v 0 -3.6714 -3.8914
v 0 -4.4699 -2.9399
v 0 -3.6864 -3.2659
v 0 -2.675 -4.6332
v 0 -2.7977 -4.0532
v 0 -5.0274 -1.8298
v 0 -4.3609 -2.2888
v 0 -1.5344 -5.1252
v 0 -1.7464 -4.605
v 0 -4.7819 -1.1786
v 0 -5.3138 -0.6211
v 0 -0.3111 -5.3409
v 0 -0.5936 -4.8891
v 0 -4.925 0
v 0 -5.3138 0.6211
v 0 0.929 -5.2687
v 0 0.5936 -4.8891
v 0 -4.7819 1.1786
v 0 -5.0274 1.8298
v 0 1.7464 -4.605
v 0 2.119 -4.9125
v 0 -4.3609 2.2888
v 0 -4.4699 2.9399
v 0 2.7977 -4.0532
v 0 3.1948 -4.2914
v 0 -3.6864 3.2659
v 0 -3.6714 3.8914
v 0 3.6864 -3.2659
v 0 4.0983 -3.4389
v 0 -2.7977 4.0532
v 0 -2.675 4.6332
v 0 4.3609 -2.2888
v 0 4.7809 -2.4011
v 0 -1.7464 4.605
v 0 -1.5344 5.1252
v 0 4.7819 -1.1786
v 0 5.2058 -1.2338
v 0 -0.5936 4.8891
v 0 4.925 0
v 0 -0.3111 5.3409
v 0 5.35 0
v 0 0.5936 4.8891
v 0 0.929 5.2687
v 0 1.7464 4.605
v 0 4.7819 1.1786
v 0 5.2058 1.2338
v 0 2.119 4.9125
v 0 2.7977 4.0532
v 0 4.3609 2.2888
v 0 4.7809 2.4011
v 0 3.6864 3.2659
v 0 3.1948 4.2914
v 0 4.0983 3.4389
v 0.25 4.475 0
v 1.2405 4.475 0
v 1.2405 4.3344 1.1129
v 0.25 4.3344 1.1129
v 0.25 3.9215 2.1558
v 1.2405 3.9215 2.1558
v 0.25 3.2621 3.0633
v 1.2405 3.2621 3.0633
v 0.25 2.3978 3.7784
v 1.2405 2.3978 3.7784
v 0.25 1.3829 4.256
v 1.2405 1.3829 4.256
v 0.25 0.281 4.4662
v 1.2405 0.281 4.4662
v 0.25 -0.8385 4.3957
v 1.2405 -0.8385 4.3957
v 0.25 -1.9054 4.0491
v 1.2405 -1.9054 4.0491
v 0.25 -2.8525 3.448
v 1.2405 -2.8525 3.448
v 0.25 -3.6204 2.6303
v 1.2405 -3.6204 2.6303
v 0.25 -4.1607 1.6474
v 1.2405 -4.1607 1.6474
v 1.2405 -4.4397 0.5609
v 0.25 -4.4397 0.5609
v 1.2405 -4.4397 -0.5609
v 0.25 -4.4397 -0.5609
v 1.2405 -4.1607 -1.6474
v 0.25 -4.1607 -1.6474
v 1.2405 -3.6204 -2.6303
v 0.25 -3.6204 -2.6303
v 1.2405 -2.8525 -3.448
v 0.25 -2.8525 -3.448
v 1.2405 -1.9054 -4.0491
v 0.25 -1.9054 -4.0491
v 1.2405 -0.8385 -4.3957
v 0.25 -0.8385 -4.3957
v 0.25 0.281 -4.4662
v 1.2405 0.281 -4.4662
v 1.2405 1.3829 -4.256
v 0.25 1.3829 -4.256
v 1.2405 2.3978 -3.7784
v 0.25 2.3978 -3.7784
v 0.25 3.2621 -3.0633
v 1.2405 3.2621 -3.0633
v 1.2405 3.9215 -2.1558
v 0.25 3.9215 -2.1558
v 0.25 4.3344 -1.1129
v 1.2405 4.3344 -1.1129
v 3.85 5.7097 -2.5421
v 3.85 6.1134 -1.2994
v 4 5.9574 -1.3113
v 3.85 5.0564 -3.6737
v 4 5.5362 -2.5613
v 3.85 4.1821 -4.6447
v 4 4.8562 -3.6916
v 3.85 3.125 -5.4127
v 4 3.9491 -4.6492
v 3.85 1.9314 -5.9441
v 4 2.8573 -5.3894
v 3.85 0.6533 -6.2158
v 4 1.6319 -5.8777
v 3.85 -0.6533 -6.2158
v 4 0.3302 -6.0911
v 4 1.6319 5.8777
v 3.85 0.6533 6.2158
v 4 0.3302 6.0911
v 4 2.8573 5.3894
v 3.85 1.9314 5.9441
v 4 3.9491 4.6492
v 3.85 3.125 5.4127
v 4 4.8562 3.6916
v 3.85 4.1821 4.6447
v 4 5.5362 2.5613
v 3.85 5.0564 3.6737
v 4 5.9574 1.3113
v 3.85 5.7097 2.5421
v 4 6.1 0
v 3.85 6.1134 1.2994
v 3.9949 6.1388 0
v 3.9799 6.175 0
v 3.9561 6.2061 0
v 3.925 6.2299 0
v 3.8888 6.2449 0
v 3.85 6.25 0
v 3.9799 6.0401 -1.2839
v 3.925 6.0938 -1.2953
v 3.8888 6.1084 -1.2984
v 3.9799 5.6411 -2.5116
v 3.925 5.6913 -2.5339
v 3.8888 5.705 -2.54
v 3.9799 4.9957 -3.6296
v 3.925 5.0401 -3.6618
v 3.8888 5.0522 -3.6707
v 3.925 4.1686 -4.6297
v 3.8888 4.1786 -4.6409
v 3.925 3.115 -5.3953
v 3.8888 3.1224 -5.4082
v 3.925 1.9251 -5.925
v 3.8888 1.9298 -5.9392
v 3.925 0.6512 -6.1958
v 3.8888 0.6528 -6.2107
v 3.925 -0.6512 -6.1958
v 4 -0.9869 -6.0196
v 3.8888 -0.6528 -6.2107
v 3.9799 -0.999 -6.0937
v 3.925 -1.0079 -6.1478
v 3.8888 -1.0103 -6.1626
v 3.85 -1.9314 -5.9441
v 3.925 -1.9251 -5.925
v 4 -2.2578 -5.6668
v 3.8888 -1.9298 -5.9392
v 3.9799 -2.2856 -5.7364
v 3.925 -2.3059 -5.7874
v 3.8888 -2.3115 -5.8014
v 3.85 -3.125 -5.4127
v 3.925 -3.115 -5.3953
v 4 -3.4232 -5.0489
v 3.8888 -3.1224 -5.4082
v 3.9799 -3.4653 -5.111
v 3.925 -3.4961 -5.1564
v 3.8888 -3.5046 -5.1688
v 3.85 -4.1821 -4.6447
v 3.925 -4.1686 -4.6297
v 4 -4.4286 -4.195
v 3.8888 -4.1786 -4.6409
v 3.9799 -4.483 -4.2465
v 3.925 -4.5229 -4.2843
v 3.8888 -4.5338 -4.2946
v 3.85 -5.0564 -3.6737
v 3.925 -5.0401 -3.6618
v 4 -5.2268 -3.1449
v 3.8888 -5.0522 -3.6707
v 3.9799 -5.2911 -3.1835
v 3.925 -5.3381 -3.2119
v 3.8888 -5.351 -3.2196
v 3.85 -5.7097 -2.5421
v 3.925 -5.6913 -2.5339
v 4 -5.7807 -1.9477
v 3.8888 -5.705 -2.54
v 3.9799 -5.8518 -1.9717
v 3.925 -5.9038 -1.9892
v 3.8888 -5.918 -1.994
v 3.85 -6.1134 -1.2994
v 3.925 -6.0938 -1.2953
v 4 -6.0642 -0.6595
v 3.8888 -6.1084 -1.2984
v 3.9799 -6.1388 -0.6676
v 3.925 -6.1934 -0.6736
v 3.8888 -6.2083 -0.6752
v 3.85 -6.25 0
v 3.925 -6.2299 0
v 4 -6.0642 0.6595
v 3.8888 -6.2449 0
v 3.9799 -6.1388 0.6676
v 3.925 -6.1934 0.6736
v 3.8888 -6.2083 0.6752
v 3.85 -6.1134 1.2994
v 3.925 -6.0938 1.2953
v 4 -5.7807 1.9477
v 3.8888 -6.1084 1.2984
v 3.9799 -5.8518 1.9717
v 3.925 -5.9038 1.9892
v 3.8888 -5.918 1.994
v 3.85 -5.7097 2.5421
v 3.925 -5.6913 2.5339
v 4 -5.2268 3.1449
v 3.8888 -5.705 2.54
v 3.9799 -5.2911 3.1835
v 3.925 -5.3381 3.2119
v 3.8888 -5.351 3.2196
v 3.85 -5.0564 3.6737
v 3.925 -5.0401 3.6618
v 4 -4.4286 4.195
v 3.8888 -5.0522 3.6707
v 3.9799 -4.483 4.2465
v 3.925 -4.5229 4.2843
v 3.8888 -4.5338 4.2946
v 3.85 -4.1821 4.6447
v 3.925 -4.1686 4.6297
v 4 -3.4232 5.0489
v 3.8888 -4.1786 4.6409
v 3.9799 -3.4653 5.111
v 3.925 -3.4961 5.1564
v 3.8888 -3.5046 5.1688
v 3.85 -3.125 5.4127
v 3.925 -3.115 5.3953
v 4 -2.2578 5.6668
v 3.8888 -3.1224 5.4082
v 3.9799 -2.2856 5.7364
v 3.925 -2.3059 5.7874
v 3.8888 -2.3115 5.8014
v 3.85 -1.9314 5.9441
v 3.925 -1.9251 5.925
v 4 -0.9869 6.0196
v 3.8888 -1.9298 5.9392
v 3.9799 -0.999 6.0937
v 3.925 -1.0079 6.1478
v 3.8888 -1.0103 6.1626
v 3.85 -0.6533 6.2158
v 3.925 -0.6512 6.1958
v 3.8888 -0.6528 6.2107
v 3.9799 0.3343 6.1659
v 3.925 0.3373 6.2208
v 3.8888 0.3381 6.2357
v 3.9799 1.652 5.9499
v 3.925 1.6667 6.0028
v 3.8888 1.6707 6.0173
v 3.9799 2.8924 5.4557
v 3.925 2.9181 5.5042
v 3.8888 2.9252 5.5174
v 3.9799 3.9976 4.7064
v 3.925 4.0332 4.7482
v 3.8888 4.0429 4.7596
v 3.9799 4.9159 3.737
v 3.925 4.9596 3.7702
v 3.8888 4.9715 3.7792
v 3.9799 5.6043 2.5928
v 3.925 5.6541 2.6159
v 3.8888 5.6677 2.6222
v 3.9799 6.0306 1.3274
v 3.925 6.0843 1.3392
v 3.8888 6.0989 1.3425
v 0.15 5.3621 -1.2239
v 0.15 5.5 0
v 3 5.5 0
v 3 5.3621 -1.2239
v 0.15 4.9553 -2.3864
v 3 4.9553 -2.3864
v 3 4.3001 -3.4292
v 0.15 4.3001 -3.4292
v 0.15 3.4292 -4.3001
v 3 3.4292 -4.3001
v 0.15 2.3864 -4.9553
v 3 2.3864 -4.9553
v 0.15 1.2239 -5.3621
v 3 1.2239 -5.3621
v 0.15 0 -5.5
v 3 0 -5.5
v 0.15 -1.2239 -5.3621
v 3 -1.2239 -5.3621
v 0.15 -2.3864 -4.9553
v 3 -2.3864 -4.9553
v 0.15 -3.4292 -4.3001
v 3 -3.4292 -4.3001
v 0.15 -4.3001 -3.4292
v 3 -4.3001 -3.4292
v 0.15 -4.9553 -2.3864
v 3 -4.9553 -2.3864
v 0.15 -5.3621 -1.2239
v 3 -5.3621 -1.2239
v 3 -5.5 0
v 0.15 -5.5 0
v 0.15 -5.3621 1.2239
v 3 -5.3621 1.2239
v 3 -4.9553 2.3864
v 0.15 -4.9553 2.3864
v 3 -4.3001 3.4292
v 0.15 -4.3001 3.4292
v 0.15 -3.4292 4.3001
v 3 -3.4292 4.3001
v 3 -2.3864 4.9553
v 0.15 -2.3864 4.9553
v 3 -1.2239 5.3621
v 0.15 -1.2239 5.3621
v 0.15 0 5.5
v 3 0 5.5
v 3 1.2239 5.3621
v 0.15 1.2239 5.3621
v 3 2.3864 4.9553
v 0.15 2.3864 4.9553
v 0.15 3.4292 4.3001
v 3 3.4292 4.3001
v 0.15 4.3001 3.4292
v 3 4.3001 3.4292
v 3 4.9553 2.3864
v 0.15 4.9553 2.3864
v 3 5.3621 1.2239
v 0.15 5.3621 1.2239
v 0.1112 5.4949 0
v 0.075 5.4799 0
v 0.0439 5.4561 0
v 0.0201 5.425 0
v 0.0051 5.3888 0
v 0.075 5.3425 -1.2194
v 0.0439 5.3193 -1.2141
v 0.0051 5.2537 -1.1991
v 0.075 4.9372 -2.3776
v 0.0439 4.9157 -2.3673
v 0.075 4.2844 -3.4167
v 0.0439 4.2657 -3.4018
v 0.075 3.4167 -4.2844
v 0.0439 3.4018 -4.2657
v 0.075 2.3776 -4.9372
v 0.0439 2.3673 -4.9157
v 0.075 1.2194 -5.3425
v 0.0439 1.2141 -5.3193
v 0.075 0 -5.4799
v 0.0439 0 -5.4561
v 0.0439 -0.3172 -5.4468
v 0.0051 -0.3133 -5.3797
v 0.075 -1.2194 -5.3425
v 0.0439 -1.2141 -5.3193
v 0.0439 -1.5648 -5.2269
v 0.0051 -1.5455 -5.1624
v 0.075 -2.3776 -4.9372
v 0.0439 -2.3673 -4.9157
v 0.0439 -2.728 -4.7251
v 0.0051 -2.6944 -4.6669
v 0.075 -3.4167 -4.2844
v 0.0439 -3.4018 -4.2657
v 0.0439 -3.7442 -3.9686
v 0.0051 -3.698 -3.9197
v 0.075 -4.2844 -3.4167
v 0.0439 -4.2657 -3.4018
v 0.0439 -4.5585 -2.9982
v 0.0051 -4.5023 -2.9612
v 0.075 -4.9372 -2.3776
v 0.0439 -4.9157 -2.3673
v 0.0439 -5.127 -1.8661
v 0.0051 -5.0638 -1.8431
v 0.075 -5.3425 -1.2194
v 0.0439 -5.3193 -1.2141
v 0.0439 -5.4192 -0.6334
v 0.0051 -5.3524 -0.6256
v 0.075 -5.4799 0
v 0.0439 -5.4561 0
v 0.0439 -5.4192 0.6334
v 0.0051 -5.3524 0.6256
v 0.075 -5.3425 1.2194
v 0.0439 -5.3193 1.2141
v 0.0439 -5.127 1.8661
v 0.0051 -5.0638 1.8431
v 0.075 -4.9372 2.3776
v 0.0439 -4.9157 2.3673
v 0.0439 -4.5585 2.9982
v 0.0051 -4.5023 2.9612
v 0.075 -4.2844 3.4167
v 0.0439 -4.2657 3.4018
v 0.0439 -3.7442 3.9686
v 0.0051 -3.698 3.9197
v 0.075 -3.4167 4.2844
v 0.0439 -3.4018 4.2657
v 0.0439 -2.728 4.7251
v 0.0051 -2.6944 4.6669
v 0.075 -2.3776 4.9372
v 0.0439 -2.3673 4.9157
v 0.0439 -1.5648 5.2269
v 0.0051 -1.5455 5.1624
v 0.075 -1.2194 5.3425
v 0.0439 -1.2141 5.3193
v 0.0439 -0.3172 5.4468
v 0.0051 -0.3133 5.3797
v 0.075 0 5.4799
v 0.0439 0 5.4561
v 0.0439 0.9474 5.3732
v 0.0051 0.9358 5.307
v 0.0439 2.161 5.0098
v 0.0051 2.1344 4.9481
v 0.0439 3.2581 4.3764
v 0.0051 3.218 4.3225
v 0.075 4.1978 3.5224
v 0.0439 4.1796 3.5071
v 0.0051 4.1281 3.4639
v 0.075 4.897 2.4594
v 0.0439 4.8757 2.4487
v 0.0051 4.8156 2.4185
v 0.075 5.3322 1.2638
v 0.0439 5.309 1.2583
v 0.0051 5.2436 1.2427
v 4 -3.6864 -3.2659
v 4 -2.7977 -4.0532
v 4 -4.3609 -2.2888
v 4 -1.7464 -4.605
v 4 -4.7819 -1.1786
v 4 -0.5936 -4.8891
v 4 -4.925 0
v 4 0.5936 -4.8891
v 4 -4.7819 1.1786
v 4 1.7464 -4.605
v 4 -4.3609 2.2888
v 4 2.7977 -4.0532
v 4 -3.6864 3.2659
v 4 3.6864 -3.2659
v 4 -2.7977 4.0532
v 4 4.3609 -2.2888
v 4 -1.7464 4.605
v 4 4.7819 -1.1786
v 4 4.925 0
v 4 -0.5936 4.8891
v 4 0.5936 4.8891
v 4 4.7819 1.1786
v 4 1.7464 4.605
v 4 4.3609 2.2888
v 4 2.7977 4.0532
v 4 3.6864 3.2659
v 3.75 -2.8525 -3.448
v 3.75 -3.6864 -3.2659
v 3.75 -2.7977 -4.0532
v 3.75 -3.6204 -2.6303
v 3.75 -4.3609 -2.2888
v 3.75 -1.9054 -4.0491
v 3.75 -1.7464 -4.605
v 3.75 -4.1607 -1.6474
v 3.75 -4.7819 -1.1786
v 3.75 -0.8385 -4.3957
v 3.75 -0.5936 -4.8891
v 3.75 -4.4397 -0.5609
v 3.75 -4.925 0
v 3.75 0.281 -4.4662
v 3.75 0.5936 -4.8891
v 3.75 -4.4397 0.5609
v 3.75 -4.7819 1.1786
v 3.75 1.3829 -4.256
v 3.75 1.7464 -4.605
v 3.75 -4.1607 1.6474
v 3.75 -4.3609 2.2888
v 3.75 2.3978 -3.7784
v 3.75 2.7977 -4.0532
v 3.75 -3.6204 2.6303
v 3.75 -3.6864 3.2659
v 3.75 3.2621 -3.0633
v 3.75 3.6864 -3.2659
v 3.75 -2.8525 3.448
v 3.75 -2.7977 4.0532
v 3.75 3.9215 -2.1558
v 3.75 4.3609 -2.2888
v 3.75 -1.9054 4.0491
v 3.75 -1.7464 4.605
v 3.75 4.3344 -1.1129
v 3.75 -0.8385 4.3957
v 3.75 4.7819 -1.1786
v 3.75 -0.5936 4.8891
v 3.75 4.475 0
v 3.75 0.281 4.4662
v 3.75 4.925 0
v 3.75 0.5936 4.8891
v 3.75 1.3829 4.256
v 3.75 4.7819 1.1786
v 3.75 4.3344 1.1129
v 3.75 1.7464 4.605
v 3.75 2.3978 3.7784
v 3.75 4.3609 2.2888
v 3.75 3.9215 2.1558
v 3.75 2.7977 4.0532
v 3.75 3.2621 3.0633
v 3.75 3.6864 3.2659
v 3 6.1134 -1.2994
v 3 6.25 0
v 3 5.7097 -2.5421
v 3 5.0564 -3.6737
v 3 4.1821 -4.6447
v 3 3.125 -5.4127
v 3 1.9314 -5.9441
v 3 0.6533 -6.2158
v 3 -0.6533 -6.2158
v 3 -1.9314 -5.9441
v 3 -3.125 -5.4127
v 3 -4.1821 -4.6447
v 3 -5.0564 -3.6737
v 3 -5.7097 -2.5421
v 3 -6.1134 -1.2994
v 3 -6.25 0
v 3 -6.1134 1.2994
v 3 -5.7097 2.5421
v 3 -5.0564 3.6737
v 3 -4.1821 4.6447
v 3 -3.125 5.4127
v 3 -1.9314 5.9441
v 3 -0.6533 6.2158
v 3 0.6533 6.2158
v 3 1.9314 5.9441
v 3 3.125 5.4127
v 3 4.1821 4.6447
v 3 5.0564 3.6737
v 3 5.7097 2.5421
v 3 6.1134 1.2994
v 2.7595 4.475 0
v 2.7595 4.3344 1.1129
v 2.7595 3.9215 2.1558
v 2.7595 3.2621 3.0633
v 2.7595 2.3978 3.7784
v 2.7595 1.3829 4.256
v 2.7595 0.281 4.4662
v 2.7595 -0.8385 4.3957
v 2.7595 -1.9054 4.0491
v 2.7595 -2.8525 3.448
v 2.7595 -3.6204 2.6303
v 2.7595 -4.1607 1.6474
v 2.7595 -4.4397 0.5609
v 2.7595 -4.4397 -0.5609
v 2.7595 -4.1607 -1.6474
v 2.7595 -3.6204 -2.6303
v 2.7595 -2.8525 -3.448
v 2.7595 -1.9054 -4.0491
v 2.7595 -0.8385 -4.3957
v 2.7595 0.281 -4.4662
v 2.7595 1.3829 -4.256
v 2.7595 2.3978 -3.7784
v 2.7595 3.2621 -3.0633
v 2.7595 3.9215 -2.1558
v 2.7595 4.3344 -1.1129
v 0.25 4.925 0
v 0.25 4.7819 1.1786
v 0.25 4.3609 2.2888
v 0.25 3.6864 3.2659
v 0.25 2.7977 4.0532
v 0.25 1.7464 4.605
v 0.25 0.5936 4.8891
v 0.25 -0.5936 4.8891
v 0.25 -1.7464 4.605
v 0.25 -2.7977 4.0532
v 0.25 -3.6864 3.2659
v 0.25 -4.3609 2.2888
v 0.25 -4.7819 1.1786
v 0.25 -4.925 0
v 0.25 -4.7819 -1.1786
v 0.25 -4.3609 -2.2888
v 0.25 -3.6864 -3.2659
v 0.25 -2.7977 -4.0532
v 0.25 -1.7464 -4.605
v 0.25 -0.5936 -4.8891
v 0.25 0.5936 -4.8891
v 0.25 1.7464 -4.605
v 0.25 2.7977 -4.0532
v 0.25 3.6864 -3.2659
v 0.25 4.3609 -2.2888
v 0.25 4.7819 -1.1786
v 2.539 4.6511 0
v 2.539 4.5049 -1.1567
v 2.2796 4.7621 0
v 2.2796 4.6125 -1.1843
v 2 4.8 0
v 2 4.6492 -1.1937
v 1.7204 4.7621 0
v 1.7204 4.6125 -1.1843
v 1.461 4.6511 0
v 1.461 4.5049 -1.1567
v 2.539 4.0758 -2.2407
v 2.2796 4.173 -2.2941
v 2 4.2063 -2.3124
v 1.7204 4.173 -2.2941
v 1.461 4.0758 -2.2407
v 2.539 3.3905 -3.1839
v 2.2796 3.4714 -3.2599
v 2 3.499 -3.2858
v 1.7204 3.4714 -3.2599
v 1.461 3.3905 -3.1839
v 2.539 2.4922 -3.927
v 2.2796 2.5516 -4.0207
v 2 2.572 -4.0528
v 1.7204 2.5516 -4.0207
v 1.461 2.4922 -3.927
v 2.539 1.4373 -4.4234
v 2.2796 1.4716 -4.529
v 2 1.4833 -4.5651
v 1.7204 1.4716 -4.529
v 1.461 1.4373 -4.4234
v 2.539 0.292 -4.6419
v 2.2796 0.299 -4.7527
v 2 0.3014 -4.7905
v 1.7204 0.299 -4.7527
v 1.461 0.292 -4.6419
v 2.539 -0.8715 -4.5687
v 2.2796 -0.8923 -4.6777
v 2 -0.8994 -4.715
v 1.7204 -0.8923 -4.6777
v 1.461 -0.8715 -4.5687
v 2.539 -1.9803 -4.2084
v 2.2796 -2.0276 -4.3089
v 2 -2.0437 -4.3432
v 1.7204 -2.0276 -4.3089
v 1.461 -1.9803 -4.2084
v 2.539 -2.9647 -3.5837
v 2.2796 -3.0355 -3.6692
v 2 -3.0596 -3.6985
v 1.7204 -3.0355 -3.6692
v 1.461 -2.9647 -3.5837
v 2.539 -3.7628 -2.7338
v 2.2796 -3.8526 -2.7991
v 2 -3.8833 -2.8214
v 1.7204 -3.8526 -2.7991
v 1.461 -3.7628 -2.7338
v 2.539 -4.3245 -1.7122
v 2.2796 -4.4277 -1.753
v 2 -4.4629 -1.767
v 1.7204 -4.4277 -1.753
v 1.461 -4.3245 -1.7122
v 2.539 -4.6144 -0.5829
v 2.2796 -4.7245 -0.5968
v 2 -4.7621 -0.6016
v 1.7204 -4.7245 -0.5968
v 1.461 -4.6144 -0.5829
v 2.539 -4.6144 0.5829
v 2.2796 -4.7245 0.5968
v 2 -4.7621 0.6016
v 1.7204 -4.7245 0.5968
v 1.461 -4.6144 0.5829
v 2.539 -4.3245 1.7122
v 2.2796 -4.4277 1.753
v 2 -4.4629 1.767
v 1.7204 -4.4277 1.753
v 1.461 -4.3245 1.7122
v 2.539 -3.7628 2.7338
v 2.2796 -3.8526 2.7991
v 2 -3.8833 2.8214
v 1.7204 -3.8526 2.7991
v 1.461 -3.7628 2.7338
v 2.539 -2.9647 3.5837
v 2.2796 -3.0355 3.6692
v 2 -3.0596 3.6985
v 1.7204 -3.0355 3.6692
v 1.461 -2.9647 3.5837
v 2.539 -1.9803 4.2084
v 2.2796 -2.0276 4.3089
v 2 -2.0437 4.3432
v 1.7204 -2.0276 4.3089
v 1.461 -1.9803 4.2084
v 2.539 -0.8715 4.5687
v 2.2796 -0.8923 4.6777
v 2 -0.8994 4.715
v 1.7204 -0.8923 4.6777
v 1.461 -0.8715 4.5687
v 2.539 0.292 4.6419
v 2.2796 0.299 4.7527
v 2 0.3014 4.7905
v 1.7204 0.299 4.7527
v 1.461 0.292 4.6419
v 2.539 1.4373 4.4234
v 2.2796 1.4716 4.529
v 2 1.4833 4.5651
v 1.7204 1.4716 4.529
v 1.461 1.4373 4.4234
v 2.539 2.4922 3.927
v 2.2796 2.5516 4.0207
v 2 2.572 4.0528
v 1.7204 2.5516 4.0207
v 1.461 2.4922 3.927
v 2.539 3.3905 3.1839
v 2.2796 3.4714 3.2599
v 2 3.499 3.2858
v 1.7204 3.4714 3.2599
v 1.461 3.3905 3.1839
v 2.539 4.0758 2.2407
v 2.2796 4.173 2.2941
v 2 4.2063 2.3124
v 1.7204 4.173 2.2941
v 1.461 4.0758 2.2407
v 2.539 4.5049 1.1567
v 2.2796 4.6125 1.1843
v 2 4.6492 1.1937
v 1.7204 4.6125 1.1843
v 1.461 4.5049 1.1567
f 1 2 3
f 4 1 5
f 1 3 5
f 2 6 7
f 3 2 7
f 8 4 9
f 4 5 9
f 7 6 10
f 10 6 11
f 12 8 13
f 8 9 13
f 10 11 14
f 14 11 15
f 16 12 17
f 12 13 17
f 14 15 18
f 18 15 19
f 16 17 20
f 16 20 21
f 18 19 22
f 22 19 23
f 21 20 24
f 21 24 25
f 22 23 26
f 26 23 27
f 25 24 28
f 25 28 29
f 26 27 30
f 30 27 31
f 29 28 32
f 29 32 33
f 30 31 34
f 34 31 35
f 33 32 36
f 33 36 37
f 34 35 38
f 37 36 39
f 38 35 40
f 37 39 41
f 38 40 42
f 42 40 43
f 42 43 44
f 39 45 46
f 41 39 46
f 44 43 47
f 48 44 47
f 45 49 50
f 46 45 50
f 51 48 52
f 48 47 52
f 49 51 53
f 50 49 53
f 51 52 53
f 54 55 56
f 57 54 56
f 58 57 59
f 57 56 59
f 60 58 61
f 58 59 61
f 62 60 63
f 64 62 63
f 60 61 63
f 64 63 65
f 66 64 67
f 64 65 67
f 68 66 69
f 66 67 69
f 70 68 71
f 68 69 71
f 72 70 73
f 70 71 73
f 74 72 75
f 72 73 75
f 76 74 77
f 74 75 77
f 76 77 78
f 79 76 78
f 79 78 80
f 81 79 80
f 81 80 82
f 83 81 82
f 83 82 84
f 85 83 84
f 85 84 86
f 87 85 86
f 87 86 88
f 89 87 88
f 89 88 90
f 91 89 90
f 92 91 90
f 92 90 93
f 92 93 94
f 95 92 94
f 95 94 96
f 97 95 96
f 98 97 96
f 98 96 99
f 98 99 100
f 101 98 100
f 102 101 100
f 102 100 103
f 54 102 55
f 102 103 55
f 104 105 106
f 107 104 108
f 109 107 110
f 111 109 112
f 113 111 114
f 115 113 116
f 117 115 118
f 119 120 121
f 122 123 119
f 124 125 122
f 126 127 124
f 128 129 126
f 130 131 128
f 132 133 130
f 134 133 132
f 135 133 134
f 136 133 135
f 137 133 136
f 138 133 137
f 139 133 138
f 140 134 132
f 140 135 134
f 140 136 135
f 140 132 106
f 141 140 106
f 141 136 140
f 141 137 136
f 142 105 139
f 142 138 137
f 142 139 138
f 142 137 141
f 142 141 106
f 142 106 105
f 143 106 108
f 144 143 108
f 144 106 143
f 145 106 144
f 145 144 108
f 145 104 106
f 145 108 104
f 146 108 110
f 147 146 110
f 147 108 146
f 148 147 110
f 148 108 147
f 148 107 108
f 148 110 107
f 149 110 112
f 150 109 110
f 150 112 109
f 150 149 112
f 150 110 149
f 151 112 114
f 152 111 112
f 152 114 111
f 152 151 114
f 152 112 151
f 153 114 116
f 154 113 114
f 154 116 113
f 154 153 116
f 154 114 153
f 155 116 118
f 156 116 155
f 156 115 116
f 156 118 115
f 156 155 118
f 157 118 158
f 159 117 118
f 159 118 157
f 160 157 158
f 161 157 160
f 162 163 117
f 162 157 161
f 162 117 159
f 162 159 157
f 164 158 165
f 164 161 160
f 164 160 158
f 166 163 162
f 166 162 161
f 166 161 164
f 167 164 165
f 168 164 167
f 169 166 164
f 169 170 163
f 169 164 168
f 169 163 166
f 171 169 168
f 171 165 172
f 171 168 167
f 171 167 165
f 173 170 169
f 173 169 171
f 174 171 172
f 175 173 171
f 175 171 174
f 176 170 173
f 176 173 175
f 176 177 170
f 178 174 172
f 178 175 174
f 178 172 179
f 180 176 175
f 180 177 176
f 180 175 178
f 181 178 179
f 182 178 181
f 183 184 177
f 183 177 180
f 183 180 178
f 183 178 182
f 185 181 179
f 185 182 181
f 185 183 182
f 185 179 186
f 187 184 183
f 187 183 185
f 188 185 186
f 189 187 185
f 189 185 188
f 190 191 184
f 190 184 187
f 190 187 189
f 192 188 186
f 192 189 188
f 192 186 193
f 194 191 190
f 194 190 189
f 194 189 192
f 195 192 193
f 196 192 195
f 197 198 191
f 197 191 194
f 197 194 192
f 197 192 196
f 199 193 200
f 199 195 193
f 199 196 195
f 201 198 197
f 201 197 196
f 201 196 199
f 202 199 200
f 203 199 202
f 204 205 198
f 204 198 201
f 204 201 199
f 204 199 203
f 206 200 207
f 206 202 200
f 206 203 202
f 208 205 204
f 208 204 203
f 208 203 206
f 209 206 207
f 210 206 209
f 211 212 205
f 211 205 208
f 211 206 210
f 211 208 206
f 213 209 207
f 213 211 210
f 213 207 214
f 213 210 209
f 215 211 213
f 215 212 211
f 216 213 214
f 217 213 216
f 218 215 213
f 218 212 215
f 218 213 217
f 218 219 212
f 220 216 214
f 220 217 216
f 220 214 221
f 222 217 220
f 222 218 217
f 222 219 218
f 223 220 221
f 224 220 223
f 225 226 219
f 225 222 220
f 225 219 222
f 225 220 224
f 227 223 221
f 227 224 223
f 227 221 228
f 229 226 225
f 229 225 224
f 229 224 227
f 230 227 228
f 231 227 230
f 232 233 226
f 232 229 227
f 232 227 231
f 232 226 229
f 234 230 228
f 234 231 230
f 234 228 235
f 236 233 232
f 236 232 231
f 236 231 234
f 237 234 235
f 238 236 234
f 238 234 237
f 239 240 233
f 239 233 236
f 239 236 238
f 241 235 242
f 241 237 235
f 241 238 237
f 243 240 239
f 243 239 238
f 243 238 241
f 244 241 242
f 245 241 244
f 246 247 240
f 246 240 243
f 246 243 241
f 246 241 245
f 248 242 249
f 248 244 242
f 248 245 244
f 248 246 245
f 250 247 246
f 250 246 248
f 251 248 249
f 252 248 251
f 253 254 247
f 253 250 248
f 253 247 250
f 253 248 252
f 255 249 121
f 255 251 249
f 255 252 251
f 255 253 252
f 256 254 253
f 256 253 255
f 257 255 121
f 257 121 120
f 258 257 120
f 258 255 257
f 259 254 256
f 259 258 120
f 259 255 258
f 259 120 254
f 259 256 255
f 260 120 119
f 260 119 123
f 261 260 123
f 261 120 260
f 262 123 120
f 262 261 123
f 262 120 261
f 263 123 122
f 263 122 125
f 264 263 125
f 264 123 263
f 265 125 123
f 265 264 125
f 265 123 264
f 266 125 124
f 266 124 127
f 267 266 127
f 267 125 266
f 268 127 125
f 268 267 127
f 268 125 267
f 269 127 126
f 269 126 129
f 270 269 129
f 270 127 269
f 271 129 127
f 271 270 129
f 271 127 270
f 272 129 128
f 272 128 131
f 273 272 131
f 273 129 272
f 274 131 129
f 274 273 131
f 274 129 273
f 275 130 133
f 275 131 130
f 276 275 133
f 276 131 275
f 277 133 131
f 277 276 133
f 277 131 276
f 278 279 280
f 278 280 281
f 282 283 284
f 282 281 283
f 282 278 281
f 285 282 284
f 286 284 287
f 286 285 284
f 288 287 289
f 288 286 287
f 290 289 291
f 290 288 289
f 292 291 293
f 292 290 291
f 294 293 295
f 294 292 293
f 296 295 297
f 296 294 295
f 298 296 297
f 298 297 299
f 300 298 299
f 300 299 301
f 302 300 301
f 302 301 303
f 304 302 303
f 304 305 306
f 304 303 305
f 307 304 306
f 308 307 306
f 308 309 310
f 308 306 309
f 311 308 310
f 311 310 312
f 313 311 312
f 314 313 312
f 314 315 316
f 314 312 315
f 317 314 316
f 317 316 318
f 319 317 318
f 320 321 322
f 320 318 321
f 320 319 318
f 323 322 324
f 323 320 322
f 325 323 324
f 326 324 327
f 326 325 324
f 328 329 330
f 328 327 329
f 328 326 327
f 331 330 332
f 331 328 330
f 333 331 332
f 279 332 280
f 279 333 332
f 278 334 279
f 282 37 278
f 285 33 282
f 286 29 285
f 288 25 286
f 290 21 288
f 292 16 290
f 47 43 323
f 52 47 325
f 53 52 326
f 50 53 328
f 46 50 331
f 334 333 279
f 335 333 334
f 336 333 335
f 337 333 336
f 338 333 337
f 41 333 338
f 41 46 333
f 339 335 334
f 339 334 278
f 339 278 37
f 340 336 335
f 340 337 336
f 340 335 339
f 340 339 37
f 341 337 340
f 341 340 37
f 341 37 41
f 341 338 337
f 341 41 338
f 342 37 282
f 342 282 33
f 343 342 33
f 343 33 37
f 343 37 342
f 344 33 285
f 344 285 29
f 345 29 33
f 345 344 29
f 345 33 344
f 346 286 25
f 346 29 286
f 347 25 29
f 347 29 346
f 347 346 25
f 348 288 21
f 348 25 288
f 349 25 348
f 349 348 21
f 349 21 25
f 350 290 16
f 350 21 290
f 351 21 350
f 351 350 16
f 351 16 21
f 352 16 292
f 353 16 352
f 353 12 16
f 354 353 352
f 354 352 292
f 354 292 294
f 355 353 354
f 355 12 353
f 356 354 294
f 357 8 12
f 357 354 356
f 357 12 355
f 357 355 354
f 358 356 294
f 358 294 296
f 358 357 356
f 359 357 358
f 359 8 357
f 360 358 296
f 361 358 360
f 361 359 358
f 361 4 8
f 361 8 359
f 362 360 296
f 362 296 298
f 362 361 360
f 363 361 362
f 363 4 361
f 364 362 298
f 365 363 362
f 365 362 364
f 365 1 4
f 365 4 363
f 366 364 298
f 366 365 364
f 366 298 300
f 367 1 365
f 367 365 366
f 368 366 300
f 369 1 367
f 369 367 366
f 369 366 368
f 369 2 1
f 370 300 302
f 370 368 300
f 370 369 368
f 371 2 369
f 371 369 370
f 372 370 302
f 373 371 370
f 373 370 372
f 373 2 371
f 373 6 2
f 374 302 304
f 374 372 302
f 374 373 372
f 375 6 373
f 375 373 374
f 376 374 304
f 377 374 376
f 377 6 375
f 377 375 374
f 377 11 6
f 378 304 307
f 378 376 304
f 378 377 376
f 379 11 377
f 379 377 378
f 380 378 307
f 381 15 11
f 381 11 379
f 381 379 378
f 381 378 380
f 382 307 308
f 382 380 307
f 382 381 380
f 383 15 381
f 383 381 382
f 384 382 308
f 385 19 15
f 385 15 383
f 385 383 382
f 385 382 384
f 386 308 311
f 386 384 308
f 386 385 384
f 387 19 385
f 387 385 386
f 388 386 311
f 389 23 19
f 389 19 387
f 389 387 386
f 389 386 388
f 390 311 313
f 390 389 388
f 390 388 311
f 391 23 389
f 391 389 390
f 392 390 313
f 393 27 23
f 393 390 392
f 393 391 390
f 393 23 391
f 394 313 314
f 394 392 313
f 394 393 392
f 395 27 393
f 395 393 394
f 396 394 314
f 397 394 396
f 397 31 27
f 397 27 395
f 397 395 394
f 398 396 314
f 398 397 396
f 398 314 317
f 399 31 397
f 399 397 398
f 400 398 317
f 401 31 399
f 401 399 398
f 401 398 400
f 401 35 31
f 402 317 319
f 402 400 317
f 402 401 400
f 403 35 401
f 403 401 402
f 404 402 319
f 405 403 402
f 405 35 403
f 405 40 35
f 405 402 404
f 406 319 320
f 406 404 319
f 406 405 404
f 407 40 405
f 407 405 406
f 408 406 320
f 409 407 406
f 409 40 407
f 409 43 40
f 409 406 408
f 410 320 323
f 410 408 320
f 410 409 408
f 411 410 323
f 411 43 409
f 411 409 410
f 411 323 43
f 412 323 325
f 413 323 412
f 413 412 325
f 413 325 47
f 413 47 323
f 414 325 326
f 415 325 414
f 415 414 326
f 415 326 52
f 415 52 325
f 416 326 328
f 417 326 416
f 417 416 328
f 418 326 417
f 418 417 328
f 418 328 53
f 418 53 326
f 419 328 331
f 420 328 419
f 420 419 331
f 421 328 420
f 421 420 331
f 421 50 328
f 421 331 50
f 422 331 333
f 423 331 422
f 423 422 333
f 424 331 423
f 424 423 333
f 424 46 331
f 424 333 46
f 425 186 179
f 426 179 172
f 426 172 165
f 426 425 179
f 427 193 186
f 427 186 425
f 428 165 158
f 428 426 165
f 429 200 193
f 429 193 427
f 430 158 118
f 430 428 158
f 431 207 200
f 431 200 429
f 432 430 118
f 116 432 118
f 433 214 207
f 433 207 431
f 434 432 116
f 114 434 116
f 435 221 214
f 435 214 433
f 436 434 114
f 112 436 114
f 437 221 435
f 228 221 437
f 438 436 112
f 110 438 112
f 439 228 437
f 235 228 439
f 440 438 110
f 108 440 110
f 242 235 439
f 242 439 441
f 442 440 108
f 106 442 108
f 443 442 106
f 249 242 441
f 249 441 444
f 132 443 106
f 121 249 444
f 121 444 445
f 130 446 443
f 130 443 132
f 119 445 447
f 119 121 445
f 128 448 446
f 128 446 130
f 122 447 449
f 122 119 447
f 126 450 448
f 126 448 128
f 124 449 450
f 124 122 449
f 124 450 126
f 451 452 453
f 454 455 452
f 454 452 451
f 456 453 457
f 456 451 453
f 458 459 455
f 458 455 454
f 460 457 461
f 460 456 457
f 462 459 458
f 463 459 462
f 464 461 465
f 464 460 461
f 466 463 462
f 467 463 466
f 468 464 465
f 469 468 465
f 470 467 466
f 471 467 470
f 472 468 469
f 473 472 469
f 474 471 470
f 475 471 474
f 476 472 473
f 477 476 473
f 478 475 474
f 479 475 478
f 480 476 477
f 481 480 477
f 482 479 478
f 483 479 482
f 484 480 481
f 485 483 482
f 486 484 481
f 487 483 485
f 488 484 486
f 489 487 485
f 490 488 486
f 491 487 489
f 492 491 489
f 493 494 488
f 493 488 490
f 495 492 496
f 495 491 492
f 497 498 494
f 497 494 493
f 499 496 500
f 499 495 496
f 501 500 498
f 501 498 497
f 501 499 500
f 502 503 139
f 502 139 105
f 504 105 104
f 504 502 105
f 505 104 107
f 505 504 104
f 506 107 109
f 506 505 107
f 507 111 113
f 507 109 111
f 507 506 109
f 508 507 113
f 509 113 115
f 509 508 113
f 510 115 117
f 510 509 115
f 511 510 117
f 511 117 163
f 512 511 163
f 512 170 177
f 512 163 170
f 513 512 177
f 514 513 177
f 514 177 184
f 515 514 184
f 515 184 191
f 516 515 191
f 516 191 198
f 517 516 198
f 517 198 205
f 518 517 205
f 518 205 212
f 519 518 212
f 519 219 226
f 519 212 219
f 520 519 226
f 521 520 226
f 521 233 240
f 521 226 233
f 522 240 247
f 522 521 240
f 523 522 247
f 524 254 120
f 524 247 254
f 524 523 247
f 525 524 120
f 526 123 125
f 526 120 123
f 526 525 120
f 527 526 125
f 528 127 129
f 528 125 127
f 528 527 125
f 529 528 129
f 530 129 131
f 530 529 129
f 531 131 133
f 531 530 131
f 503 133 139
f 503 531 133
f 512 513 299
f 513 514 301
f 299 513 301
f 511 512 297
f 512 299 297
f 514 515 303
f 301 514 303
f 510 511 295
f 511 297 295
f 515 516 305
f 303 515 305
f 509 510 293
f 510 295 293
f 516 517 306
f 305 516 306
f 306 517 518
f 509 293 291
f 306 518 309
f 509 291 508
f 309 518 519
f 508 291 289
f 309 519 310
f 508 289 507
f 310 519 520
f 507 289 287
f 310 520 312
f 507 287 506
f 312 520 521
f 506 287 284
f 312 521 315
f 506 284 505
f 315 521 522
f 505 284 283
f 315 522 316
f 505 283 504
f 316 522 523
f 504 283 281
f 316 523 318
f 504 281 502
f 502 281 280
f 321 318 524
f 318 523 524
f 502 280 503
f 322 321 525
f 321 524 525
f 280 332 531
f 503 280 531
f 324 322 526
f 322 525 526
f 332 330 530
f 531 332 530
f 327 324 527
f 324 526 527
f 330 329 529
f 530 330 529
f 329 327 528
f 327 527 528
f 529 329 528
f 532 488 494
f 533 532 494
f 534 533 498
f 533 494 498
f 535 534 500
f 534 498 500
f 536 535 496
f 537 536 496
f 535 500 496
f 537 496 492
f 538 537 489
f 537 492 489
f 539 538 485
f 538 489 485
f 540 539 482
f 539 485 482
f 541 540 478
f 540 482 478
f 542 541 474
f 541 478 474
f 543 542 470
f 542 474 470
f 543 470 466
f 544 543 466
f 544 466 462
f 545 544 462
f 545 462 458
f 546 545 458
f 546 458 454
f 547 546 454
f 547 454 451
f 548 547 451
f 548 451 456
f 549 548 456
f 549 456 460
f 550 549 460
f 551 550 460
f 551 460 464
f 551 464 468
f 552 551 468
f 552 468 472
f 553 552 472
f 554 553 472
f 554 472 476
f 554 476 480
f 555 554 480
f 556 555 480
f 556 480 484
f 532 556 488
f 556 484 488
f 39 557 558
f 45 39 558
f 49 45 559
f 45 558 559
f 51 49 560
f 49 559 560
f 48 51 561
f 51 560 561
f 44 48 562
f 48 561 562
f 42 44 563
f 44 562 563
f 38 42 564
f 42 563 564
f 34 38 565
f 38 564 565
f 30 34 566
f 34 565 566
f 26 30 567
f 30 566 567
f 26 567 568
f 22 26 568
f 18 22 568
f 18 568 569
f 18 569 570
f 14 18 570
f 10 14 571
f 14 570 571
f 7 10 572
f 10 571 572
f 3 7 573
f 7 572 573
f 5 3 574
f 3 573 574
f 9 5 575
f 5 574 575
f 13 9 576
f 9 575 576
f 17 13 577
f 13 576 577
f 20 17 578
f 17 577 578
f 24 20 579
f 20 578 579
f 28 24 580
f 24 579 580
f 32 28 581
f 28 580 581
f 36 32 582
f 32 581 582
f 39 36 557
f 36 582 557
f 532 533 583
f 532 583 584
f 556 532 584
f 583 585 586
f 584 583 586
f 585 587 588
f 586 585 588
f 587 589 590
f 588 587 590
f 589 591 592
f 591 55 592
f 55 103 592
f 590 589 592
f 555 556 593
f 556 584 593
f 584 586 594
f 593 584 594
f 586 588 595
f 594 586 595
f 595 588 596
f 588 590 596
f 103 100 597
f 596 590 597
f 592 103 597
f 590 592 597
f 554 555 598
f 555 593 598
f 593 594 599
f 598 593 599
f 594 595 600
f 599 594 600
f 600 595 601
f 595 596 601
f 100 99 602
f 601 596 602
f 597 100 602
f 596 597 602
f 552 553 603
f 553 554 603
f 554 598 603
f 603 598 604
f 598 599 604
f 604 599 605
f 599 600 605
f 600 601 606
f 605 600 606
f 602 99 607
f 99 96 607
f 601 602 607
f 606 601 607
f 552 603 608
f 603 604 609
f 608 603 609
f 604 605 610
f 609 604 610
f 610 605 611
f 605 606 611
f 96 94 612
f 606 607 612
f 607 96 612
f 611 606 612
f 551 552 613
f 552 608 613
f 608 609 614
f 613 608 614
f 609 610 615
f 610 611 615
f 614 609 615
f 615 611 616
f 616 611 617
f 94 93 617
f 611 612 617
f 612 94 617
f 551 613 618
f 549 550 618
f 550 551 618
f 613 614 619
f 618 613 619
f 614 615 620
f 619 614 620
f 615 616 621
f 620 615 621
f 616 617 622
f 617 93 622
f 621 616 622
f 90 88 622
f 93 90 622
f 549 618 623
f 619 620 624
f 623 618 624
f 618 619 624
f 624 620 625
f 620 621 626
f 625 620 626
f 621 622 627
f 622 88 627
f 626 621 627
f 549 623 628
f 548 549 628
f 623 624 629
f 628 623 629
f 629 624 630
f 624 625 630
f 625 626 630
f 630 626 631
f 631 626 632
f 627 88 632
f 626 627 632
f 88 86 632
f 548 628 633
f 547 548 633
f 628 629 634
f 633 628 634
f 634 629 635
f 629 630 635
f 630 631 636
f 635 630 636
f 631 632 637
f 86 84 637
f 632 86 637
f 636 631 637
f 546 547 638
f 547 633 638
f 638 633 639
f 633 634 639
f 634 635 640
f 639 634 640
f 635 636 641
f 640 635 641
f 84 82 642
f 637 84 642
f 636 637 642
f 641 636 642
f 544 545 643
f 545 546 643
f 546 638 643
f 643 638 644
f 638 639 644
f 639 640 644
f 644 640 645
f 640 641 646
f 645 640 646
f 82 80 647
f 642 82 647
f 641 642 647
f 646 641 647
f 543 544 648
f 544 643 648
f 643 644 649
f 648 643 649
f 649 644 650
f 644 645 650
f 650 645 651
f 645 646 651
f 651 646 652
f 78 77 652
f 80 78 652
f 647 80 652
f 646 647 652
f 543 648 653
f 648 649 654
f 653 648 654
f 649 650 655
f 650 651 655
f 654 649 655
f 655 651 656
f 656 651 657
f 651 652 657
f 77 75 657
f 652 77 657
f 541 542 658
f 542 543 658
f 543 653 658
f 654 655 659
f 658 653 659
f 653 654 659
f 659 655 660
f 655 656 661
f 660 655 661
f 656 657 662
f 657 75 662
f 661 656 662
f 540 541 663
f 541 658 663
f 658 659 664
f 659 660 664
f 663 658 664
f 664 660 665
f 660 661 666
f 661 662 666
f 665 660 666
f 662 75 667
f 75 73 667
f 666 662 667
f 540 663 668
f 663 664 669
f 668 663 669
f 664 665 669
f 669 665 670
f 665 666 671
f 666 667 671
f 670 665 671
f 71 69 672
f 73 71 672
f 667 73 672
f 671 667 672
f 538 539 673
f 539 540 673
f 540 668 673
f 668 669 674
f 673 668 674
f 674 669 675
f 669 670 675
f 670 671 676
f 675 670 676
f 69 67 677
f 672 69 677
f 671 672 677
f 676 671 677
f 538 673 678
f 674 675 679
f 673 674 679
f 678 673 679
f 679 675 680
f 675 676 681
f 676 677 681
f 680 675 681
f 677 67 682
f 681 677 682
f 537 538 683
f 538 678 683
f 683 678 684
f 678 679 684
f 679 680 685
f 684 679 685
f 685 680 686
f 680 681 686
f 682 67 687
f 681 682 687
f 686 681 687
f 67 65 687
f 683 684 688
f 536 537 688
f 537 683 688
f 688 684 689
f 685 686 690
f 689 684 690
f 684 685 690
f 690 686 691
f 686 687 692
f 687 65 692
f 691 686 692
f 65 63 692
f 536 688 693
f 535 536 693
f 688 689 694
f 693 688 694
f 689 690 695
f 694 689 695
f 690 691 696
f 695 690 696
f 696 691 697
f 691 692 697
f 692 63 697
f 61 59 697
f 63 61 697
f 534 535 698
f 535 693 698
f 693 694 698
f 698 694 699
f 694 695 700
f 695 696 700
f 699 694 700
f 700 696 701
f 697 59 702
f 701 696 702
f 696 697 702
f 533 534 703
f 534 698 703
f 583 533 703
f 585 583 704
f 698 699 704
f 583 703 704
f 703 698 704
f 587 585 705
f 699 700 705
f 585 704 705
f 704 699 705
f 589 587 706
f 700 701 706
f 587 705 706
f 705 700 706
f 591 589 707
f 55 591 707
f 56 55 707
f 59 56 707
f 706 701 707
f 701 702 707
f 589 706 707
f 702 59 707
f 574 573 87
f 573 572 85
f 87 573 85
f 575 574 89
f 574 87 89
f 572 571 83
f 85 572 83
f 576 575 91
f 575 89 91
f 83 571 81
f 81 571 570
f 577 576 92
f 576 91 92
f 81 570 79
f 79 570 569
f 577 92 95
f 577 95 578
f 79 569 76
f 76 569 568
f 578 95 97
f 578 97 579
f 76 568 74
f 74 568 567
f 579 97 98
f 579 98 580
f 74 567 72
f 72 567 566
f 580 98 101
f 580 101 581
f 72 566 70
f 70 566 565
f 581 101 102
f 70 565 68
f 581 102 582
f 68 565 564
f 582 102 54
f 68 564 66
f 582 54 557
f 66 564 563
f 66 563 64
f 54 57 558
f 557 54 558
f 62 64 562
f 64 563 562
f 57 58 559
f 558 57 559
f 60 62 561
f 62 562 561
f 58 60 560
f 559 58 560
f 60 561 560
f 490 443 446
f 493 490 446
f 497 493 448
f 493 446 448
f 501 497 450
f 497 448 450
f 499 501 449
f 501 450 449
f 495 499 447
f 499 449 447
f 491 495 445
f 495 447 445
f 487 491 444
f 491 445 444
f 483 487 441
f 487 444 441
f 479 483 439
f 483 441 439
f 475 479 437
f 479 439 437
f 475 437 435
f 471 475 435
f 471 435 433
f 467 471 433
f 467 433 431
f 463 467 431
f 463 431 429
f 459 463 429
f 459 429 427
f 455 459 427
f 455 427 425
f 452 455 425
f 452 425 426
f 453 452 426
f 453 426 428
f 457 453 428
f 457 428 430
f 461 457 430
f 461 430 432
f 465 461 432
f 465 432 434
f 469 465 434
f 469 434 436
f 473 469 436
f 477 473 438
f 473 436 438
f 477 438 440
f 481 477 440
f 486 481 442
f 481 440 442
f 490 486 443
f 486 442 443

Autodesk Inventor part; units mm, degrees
sketch "Sketch_1" plane through (0, 0, 0) normal (0, 0, 1) x (1, 0, 0)
  line L0 (4, 0) -> (0, 0)
  line L1 (0, 4.925) -> (0.25, 4.925)
  line L2 (0.25, 4.925) -> (0.25, 4.475)
  line L3 (0.25, 4.475) -> (1.2405, 4.475)
  arc A0 (2.7595, 4.475) -> (1.2405, 4.475) centre (2, 3.75) ccw
  line L4 (2.7595, 4.475) -> (3.75, 4.475)
  line L5 (3.75, 4.475) -> (3.75, 4.925)
  line L6 (3.75, 4.925) -> (4, 4.925)
  line L7 (4, 4.925) -> (4, 6.1)
  arc A1 (4, 6.1) -> (3.85, 6.25) centre (3.85, 6.1) ccw
  line L8 (3.85, 6.25) -> (3, 6.25)
  line L9 (3, 6.25) -> (3, 5.5)
  line L10 (3, 5.5) -> (0.15, 5.5)
  arc A2 (0.15, 5.5) -> (0, 5.35) centre (0.15, 5.35) ccw
  line L11 (0, 5.35) -> (0, 4.925)
revolve "Revolution1" add sketch "Sketch_1" angle 360 about axis through (4, 0, 0) along (1, 0, 0)
ref_plane "ip_st_1_XY" through (0, 0, 0) normal (1, 0, 0) x (0, 0, -1)
ref_plane "ip_st_1_YZ" through (0, 0, 0) normal (0, 0, -1) x (0, 1, 0)
ref_plane "ip_st_1_ZX" through (0, 0, 0) normal (0, 1, 0) x (1, 0, 0)
ref_plane "ip_st_2_XY" through (3.75, 0, 0) normal (-1, 0, 0) x (0, 0, -1)
ref_plane "ip_st_2_YZ" through (3.75, 0, 0) normal (0, 0, -1) x (0, -1, 0)
ref_plane "ip_st_2_ZX" through (3.75, 0, 0) normal (0, -1, 0) x (-1, 0, 0)
properties part number "F694ZZ Outer Ring" material "ステンレス鋼 440C"
